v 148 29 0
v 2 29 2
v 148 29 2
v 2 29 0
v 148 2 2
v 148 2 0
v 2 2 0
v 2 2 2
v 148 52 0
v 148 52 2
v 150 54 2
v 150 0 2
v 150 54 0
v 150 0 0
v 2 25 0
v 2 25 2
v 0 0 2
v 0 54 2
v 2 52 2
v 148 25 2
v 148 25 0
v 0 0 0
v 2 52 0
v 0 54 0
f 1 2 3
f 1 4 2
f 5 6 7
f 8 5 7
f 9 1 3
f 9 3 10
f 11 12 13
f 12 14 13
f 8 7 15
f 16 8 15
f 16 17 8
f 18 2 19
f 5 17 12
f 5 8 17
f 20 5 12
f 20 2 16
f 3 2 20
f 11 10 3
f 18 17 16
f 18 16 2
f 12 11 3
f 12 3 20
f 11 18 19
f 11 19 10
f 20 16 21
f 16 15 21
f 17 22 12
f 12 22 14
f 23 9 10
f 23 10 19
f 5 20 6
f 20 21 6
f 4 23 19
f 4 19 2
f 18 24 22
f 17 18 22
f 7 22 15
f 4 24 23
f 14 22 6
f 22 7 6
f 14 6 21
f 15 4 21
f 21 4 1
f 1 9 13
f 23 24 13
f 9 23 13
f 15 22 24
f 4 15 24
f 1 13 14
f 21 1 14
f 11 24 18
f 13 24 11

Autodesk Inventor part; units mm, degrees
ref_plane "YZ Plane" through (0, 0, 0) normal (1, 0, 0) x (0, 1, 0)
ref_plane "XZ Plane" through (0, 0, 0) normal (0, 1, 0) x (-1, 0, 0)
ref_plane "XY Plane" through (0, 0, 0) normal (0, 0, 1) x (1, 0, 0)
sketch "Esboço1" plane through (0, 0, 0) normal (0, 0, 1) x (1, 0, 0)
  line L0 (0, 0) -> (150, 0)
  line L1 (150, 0) -> (150, 27)
  line L2 (150, 27) -> (0, 27)
  line L3 (0, 27) -> (0, 0)
  line L4 (2, 25) -> (148, 25)
  line L5 (148, 25) -> (148, 2)
  line L6 (148, 2) -> (2, 2)
  line L7 (2, 2) -> (2, 25)
  line L8 (0, 27) -> (150, 27) construction
  line L9 (0, 54) -> (150, 54)
  line L10 (150, 54) -> (150, 27)
  line L11 (0, 27) -> (0, 54)
  line L12 (2, 29) -> (148, 29)
  line L13 (148, 29) -> (148, 52)
  line L14 (148, 52) -> (2, 52)
  line L15 (2, 52) -> (2, 29)
  dimension "d6" = 150
  dimension "d7" = 27
  dimension "d8" = 2
  dimension "d9" = 2
  dimension "d10" = 2
  dimension "d11" = 2
extrude "Extrusão1" add sketch "Esboço1" along normal blind 2
properties part number "Grade"
